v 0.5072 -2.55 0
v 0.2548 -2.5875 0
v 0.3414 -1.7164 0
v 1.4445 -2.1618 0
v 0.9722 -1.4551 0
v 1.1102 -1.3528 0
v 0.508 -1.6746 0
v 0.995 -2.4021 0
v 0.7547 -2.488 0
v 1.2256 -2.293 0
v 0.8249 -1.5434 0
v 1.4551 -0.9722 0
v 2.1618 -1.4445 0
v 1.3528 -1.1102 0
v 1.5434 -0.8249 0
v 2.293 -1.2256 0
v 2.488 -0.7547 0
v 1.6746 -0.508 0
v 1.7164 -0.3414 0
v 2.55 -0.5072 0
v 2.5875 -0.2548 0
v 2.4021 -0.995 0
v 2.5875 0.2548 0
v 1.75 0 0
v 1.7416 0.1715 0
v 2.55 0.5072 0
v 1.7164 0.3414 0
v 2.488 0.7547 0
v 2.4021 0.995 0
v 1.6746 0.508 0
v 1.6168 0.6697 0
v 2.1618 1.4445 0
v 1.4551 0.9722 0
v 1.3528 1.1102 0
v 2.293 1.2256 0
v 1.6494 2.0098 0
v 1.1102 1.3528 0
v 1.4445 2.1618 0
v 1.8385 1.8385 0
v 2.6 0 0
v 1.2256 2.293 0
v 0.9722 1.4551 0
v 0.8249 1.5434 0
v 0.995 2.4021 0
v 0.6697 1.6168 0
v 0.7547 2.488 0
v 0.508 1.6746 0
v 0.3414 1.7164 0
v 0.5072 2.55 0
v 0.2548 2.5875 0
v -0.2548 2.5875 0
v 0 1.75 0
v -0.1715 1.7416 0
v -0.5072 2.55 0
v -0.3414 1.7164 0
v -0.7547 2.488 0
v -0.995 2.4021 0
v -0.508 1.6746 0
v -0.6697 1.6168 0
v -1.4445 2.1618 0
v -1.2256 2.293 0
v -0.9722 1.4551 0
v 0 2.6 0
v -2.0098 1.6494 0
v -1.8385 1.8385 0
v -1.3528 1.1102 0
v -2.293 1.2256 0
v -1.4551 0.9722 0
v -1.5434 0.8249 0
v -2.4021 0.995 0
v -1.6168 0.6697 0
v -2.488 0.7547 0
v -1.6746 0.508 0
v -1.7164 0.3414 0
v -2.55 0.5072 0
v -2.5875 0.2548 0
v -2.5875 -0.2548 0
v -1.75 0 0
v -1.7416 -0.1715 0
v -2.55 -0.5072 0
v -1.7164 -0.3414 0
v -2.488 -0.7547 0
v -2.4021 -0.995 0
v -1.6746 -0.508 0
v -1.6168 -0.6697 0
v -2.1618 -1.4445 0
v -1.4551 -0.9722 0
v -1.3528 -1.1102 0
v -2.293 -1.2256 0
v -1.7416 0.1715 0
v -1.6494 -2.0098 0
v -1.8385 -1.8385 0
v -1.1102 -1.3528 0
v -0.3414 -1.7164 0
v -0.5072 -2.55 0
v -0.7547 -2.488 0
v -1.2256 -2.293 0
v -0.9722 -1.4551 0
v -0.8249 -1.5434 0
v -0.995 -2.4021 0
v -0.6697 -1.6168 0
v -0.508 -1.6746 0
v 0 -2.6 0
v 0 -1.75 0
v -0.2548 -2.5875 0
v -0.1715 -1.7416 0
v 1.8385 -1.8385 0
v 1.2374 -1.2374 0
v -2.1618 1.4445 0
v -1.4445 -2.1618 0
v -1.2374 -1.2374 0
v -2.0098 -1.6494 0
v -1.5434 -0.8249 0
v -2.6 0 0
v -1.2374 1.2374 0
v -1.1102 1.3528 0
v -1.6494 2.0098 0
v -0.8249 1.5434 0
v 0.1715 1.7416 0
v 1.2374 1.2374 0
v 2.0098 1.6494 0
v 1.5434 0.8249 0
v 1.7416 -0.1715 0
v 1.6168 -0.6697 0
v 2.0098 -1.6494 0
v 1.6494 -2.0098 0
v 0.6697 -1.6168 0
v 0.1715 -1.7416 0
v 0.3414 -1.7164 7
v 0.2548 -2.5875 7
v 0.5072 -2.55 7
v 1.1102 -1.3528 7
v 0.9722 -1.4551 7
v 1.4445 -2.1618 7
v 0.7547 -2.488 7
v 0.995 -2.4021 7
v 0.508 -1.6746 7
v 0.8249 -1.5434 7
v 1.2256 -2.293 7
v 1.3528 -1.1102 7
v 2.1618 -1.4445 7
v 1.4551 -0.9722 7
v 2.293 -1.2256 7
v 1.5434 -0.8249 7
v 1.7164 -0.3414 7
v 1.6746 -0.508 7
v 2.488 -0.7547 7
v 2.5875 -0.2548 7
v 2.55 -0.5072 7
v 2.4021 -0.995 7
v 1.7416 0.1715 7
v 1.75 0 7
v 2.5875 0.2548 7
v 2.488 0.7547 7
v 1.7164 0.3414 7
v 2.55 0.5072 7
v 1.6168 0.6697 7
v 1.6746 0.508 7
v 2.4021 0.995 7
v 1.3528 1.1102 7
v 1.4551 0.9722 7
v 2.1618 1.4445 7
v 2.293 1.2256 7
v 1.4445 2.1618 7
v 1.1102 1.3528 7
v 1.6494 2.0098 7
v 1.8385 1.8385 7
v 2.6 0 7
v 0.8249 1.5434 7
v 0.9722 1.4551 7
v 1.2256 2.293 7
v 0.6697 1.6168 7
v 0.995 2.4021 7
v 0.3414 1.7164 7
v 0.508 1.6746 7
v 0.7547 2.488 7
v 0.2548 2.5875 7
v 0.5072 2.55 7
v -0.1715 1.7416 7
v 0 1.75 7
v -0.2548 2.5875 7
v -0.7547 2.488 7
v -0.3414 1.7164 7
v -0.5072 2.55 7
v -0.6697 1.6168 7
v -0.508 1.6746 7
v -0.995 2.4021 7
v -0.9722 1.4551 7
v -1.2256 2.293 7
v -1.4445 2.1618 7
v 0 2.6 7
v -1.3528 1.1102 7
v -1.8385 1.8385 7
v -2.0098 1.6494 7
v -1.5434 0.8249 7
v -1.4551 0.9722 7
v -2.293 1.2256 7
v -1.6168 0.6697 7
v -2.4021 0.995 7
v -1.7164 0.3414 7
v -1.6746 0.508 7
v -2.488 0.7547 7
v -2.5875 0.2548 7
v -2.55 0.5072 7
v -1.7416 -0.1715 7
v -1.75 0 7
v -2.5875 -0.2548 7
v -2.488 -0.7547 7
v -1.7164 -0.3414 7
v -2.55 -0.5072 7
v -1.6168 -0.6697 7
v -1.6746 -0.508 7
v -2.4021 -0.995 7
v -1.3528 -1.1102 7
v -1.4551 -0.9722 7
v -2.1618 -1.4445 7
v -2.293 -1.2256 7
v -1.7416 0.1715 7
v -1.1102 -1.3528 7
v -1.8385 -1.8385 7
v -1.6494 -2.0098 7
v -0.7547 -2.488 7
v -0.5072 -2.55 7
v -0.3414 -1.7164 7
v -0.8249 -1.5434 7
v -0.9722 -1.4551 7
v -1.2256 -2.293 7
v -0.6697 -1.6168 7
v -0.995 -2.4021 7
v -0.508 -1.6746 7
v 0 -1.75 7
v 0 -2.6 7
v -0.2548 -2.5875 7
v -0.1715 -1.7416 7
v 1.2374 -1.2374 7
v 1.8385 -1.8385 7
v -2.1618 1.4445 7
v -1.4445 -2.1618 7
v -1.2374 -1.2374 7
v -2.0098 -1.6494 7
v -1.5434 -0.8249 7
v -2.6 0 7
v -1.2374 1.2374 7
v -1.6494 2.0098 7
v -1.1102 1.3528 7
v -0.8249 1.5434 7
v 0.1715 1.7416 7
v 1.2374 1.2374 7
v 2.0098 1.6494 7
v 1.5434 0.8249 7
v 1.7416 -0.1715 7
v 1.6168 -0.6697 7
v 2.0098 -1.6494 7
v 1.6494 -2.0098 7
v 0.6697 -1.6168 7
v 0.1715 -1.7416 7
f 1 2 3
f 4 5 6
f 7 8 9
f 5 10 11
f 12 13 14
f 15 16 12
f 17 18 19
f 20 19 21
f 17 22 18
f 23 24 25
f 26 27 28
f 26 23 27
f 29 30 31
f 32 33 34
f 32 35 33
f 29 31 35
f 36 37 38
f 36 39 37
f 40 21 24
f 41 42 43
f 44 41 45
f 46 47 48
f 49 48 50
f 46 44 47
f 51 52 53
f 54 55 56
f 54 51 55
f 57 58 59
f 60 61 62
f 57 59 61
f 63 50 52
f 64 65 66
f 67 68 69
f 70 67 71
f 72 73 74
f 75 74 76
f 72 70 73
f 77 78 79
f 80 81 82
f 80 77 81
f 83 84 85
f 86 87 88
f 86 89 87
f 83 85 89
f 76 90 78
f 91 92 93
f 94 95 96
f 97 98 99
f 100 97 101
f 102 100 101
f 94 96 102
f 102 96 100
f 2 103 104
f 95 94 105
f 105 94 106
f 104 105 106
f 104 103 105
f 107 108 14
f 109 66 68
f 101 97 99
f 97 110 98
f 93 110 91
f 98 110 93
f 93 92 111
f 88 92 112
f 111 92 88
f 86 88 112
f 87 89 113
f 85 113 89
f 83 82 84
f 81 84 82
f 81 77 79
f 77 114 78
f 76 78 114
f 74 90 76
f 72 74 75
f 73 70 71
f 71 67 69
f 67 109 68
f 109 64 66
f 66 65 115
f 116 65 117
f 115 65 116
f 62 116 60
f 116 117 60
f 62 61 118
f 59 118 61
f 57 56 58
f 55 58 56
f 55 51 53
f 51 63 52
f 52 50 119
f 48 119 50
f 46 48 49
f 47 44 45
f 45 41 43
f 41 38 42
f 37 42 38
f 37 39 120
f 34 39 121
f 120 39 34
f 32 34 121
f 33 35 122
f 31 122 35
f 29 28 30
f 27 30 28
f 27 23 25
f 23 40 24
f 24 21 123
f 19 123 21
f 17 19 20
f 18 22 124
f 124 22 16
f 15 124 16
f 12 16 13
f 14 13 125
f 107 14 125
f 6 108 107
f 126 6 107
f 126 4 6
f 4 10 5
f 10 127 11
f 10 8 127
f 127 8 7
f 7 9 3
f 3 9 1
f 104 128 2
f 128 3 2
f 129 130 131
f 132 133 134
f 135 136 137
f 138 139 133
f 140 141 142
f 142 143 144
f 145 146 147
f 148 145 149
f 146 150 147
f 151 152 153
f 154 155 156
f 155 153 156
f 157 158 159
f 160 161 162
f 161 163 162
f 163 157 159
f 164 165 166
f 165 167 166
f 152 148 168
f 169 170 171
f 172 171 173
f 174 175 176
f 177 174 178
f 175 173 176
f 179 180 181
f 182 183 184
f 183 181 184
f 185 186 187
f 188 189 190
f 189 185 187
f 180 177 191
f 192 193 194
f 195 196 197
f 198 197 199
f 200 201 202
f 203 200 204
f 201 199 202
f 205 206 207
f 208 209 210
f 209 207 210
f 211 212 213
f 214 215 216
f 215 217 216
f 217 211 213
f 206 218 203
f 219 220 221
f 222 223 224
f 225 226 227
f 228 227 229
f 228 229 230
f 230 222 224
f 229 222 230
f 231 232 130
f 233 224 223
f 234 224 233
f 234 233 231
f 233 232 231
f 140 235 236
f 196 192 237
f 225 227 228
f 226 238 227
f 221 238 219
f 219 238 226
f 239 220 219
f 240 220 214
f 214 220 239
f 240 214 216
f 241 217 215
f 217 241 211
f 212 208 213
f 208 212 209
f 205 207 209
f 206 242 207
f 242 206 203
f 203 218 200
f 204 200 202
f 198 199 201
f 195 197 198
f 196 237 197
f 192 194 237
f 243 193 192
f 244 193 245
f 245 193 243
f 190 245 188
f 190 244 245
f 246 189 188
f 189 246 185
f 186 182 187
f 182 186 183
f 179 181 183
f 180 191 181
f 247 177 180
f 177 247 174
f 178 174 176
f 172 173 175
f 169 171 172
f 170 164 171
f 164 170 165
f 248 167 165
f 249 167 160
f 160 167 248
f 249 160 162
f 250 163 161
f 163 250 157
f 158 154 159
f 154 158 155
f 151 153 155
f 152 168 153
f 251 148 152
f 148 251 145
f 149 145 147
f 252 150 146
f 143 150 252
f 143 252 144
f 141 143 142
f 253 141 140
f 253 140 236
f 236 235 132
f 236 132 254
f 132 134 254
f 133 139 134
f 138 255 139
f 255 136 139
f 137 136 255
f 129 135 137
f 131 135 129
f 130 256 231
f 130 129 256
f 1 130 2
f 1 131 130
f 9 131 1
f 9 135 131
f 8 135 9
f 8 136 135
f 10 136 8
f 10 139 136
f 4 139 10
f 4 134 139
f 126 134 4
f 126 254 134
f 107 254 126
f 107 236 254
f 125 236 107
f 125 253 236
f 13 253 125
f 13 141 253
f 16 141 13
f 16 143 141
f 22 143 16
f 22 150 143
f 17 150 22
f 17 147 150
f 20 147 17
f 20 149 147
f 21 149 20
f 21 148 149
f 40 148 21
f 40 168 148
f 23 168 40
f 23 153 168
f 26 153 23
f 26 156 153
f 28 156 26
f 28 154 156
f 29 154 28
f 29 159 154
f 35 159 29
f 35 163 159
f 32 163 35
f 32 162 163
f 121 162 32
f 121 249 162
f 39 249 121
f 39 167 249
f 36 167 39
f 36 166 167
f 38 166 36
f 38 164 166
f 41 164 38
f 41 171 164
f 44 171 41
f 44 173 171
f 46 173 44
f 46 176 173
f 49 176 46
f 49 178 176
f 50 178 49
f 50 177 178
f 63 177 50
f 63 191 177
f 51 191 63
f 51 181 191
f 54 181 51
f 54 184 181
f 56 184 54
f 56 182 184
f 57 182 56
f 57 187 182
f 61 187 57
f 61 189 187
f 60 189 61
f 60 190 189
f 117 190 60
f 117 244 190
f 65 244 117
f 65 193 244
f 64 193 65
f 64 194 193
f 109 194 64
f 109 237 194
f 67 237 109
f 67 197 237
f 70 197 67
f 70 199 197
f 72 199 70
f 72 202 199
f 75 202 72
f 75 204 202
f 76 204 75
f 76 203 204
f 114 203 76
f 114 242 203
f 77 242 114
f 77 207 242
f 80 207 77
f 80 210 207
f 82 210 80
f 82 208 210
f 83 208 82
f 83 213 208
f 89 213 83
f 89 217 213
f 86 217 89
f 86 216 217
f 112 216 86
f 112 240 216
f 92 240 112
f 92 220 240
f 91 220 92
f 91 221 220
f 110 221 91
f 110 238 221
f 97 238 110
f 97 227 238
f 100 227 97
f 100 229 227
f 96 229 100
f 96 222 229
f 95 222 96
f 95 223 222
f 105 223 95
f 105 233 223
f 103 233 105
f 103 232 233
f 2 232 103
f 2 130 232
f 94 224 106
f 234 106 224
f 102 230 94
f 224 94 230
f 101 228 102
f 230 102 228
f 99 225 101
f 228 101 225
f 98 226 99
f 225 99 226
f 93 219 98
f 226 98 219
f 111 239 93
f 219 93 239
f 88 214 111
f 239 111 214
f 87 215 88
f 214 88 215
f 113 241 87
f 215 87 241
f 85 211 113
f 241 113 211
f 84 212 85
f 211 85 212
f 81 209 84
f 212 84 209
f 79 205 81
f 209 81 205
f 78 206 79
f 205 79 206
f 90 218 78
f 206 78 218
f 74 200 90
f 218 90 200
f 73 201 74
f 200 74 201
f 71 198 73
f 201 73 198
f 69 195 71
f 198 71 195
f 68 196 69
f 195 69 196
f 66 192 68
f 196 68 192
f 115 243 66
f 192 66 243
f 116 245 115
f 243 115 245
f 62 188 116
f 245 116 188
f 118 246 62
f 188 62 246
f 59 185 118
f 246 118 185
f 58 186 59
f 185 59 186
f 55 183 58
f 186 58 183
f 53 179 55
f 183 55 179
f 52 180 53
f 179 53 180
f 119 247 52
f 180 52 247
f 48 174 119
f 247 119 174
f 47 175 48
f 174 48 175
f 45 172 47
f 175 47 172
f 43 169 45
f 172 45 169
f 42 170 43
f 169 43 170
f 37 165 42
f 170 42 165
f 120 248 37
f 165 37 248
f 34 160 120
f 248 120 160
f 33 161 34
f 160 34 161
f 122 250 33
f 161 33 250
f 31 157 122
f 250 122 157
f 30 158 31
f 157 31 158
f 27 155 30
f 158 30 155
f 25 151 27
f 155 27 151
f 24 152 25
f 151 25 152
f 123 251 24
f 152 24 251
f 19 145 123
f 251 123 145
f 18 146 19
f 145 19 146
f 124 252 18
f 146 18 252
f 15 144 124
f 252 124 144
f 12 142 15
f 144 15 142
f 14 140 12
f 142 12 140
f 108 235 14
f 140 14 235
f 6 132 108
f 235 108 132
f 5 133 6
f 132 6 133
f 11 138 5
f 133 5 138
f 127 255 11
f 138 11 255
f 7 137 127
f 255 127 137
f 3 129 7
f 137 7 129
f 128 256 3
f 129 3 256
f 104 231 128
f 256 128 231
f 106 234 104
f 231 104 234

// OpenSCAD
wall = .85;
height = 7;
innerDiameter = 3.5;

$fn=64;
linear_extrude(height=height) 
difference() {
    circle(d=innerDiameter+2*wall);
    circle(d=innerDiameter);
}
